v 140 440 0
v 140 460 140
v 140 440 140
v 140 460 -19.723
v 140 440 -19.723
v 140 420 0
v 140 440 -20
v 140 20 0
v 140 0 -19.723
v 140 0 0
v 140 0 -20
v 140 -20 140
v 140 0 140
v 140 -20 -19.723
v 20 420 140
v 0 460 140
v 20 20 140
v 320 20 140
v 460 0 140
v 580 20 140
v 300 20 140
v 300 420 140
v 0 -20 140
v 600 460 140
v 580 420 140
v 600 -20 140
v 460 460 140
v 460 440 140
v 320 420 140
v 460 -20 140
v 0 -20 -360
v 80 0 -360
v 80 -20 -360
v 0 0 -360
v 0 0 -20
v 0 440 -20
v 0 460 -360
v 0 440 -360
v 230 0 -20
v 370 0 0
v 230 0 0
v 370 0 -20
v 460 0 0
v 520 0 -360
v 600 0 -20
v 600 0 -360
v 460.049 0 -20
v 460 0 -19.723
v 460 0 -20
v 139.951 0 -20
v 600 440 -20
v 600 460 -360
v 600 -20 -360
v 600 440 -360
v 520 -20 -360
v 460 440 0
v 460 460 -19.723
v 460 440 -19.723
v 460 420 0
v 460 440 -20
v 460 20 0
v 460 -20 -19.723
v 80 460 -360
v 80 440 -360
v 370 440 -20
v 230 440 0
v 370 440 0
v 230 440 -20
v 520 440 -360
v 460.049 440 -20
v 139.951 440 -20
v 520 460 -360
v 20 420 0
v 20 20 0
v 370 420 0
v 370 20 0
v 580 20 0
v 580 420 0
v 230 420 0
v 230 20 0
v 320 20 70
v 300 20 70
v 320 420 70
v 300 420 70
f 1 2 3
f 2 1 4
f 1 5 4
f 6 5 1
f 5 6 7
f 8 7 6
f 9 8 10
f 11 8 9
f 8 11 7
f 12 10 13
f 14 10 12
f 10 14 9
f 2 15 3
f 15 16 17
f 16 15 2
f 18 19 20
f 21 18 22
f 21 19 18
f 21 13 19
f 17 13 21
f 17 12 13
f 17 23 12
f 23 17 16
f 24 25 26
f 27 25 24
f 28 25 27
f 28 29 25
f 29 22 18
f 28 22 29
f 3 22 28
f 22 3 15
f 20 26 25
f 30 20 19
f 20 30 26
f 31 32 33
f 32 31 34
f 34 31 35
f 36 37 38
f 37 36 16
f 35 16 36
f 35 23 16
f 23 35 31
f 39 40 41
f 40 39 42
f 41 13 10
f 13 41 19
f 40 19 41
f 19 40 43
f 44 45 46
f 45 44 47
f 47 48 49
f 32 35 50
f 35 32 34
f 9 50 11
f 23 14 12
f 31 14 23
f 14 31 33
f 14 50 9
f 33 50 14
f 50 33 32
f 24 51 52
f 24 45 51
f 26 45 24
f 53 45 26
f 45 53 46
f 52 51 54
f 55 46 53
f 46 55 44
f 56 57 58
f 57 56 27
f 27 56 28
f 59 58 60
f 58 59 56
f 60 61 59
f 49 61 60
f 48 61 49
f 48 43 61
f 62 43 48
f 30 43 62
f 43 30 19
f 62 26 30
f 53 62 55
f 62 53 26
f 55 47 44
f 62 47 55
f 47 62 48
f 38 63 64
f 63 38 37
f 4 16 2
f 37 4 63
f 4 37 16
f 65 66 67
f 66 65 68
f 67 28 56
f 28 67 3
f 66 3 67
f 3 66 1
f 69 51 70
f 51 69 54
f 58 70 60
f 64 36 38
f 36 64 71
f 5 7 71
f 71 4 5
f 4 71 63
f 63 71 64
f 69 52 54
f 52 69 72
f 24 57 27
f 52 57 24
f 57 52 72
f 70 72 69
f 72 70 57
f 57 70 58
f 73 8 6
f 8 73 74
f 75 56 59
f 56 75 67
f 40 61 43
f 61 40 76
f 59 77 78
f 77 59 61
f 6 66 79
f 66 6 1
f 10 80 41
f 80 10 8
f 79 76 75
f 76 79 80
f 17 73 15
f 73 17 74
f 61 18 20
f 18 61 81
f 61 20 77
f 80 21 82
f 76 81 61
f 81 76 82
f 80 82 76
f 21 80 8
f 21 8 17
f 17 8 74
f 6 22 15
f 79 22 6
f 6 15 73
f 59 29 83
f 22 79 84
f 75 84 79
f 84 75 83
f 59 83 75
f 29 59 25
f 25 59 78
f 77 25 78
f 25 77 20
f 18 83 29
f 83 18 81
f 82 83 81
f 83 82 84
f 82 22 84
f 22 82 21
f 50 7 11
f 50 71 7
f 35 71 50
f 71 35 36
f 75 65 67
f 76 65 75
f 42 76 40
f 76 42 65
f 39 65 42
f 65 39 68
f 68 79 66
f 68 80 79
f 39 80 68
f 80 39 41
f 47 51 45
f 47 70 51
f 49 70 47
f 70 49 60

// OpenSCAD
// front box board
translate([20, 0, 0]) cube(size=[580, 20, 140]);
// back box board
translate([20, 420, 0]) cube(size=[580, 20, 140]);
// left box board
cube(size=[20, 440, 140]);
// right box board
translate([580, 0, 0]) cube(size=[20, 440, 140]);
// center divider board
translate([300, 20, 70]) cube(size=[20, 400, 70]);
// left support rail
translate([0, 0, -20]) cube(size=[140, 440, 20]);
// center support rail
translate([230, 0, -20]) cube(size=[140, 440, 20]);
// right support rail
translate([460, 0, -20]) cube(size=[140, 440, 20]);
// front left leg
difference() {
translate([0, -20, -360]) cube(size=[140, 20, 500]);
translate([80, -20, -360]) rotate([0, 10, 0]) cube(size=[140, 20, 500]);
}
// front right leg
difference() {
translate([600-140, -20, -360]) cube(size=[140, 20, 500]);
translate([600-80, -20, -360]) rotate([0, -10, 0]) translate([-140, 0, 0]) cube(size=[140, 20, 500]);
// NOTE: to rotate around right edge instead of left, need to translate + rotate and THEN move into position
}
// back left leg
difference() {
translate([0, 440, -360]) cube(size=[140, 20, 500]);
translate([80, 440, -360]) rotate([0, 10, 0]) cube(size=[140, 20, 500]);
}
// back right leg
difference() {
translate([600-140, 440, -360]) cube(size=[140, 20, 500]);
translate([600-80, 440, -360]) rotate([0, -10, 0]) translate([-140, 0, 0]) cube(size=[140, 20, 500]);
// NOTE: to rotate around right edge instead of left, need to translate + rotate and THEN move into position
}
